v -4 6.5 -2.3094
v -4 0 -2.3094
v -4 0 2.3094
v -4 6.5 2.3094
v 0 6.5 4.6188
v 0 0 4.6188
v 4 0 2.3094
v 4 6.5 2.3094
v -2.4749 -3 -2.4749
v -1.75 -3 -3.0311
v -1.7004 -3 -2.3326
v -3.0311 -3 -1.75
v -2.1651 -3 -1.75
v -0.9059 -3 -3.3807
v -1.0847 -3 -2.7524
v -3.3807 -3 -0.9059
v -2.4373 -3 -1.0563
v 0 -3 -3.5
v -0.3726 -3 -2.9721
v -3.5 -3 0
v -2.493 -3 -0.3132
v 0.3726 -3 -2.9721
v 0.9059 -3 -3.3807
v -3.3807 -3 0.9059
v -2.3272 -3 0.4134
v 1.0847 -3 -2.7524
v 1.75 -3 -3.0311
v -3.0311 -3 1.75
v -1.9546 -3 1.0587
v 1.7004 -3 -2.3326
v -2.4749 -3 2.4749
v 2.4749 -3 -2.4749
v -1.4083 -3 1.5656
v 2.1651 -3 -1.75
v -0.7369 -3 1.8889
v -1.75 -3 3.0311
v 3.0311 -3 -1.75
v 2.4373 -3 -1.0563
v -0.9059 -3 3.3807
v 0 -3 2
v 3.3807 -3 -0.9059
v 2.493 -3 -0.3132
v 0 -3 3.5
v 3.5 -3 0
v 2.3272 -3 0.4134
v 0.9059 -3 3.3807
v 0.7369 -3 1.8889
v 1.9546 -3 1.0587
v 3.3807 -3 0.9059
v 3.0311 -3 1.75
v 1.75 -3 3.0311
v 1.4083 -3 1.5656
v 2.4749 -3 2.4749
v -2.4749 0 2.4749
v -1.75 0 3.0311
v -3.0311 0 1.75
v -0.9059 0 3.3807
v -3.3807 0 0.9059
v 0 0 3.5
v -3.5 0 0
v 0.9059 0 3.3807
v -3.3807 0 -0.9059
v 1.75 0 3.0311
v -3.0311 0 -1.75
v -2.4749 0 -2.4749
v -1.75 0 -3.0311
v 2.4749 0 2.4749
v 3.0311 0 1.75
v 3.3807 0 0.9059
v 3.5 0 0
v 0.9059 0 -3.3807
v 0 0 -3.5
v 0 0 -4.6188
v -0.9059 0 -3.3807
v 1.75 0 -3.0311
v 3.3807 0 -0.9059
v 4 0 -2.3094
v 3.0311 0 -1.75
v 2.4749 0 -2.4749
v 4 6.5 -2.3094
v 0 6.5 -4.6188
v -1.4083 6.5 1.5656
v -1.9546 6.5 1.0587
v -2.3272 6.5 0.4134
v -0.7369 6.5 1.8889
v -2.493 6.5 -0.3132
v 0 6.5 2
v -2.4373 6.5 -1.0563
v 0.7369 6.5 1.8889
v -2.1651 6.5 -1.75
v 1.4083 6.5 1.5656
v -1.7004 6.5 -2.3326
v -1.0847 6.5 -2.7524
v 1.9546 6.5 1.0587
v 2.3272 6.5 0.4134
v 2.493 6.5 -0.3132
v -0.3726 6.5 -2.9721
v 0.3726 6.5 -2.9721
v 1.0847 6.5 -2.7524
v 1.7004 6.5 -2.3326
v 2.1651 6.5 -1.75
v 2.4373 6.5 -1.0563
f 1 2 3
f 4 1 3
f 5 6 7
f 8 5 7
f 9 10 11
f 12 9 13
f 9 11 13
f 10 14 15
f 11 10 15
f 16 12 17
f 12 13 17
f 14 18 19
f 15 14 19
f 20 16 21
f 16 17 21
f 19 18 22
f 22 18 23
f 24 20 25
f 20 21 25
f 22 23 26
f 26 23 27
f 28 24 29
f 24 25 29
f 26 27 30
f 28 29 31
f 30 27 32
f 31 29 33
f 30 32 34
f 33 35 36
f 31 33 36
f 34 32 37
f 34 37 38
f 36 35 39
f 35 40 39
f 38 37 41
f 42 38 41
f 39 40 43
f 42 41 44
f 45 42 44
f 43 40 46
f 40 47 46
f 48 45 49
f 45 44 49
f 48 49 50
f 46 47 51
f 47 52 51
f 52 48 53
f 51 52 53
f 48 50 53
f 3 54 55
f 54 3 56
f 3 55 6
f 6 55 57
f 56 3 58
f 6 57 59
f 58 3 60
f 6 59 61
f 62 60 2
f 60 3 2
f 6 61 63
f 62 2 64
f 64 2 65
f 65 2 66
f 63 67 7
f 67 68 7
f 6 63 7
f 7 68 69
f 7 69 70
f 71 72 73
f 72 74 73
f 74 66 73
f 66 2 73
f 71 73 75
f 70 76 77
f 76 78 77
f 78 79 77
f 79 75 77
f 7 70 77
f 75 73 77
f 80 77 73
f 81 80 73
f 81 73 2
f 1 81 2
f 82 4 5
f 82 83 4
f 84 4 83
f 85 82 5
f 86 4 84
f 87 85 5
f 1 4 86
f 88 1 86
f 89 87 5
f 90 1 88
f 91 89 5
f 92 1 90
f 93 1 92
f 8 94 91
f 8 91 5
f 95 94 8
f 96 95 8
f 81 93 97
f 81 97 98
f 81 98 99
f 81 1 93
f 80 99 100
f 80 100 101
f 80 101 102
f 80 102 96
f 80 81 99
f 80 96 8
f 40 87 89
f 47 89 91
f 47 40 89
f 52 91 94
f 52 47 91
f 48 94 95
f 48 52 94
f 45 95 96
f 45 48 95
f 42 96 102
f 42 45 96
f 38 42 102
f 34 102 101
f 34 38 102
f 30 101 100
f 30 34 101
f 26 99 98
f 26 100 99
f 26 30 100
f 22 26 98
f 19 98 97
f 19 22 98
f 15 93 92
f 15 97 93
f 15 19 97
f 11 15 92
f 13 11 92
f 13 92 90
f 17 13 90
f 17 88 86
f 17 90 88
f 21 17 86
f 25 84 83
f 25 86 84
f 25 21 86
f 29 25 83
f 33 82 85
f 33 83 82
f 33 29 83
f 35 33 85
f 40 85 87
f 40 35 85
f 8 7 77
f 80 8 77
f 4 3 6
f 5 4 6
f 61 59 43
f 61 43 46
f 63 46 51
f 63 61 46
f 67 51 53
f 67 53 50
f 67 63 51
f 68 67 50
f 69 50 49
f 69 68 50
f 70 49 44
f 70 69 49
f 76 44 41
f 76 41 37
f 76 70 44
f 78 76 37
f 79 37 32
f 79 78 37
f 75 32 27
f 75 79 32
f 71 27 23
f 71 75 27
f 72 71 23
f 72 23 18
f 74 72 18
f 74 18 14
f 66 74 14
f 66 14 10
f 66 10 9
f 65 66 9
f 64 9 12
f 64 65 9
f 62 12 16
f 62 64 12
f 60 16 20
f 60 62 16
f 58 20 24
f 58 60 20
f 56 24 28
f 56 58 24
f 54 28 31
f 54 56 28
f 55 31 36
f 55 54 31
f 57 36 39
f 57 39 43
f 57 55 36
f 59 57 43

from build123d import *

# Parameters (mm, degrees)
EXTRUDE_1_DEPTH     = 6.5
SKETCH_2_R          = 3.5
SKETCH_2_R_2        = 2.5
EXTRUDE_2_DEPTH     = 3
SKETCH_2_2_R        = 2.5
CUT_EXTRUDE_1_DEPTH = 9.920949127


with BuildPart() as part:
    # Эскиз1 → Бобышка-Вытянуть1 (new body)
    with BuildSketch(Plane(origin=(0, 0, 0), x_dir=(1, 0, 0), z_dir=(0, 1, 0))):
        Polygon((0, -4.618802154), (4, -2.309401077), (4, 2.309401077), (0, 4.618802154), (-4, 2.309401077), (-4, -2.309401077), align=None)
    extrude(amount=EXTRUDE_1_DEPTH)

    # Эскиз2 → Бобышка-Вытянуть2 (add)
    with BuildSketch(Plane(origin=(0, 0, 0), x_dir=(1, 0, 0), z_dir=(0, 1, 0))):
        Circle(SKETCH_2_R)
        with Locations((0, 0.5)):
            Circle(SKETCH_2_R_2, mode=Mode.SUBTRACT)
    extrude(amount=-EXTRUDE_2_DEPTH)

    # Эскиз2<2> → Вырез-Вытянуть1 (cut, through all)
    with BuildSketch(Plane(origin=(0, 0, 0), x_dir=(1, 0, 0), z_dir=(0, 1, 0))):
        with Locations((0, 0.5)):
            Circle(SKETCH_2_2_R)
    extrude(amount=CUT_EXTRUDE_1_DEPTH, mode=Mode.SUBTRACT)


solid = part.part
